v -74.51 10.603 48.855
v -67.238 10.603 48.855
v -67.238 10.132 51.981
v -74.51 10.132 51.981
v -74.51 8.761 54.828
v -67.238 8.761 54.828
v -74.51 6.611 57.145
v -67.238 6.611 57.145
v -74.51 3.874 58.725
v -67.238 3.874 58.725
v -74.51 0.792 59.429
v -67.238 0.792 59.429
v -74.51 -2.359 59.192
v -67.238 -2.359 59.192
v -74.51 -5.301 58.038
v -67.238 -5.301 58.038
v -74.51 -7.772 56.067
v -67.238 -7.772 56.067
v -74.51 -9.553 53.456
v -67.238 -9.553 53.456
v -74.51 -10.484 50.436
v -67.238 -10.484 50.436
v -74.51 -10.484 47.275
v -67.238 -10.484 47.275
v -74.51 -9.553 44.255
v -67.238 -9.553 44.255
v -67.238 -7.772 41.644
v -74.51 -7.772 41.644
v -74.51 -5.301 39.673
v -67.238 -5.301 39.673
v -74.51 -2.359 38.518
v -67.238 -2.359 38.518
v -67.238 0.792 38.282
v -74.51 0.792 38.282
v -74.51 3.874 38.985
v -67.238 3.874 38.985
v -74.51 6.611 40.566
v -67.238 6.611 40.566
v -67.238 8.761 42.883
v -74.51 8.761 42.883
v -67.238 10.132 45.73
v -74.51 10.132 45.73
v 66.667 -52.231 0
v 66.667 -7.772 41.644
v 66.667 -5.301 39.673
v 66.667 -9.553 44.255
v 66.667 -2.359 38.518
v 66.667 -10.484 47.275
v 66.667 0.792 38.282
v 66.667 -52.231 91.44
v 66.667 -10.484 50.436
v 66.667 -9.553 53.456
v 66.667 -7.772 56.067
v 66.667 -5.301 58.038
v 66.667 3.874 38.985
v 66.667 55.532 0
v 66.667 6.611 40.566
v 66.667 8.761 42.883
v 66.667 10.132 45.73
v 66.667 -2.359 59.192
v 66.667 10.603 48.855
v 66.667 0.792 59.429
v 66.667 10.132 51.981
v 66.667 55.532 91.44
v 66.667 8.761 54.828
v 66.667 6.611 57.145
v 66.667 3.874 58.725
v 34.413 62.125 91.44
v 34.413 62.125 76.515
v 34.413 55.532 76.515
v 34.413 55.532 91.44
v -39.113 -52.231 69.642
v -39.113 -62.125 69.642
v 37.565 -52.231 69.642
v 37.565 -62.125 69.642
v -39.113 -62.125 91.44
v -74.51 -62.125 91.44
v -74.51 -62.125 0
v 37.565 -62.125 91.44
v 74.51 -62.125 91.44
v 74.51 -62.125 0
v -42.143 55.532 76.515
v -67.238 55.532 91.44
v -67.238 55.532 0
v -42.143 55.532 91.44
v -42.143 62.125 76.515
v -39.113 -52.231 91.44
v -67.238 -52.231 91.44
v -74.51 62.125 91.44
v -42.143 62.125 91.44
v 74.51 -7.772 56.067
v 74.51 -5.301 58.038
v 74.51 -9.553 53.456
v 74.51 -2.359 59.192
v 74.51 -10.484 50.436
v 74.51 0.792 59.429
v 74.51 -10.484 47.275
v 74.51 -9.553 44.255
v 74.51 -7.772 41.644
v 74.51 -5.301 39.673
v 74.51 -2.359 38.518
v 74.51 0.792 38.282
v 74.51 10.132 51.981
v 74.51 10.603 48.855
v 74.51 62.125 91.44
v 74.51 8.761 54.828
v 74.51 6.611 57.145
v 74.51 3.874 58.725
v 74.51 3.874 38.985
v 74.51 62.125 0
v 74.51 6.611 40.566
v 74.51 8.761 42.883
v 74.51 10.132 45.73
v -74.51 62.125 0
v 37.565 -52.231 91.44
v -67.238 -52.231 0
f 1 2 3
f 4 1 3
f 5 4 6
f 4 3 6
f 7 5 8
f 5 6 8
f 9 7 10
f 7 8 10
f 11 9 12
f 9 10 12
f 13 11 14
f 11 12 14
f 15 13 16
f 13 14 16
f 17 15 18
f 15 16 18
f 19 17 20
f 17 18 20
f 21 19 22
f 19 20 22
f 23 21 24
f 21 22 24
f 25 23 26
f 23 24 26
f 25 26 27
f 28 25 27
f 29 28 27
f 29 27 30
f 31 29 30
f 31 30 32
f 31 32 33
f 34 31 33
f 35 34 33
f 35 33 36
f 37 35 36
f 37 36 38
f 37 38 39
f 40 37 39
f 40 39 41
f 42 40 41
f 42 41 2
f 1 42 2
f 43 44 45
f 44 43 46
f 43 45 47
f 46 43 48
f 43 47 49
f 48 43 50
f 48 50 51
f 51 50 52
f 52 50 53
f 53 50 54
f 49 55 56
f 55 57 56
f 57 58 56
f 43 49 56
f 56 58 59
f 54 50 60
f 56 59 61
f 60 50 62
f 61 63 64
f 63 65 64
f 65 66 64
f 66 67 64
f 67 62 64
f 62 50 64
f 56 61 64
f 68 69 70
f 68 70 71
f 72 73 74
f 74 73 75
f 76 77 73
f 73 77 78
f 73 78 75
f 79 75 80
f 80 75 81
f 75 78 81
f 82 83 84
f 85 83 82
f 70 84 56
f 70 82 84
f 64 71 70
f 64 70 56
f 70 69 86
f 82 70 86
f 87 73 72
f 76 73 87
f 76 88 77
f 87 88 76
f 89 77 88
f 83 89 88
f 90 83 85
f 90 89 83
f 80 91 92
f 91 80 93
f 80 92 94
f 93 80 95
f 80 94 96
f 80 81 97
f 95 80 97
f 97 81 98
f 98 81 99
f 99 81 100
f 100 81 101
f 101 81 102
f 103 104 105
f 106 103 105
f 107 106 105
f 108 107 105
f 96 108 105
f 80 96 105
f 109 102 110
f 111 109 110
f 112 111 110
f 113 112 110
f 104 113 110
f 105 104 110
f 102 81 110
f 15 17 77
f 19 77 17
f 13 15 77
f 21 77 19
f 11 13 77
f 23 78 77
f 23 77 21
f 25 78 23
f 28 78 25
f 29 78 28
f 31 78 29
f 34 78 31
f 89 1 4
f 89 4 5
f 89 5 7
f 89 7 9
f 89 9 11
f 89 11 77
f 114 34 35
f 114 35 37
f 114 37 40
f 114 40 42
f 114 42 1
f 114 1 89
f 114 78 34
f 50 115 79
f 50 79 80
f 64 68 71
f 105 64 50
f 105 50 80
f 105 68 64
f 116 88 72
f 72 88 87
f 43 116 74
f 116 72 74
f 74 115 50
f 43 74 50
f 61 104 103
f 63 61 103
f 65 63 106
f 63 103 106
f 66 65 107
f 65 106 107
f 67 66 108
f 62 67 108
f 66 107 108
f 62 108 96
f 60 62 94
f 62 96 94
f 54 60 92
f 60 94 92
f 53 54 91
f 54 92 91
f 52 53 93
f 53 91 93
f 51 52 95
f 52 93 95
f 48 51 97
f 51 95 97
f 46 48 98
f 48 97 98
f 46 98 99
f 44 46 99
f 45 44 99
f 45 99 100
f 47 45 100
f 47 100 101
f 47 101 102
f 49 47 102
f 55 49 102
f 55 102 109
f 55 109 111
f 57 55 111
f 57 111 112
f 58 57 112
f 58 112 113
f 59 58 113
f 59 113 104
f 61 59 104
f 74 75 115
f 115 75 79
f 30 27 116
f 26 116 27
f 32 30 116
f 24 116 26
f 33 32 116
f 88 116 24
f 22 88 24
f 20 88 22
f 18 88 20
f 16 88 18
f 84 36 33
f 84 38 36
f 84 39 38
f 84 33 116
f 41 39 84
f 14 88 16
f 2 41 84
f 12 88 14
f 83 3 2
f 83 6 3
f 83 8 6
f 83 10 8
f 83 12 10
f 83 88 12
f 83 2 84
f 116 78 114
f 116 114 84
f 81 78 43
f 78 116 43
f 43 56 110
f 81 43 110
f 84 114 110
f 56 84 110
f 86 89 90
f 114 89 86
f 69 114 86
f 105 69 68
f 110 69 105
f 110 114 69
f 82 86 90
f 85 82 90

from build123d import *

# Parameters (mm, degrees)
F0_W     = 149.0205824375
F0_H     = 124.2497935891
F1_DEPTH = 91.44
F2_W     = 133.9053437114
F2_H     = 107.7639774892
F3_DEPTH = 91.441
F4_W     = 76.6777545214
F4_H     = 21.7983949804
F5_DEPTH = 25.4
F6_W     = 76.5557736158
F6_H     = 14.9245489264
F7_DEPTH = 25.4
F8_R     = 10.6028855258
F9_DEPTH = 149.0215824375


with BuildPart() as f1:
    # F0 (on Top) → F1 (new body)
    with BuildSketch(Plane.XY):
        Rectangle(F0_W, F0_H)
    extrude(amount=F1_DEPTH)

    # F2 (on face) → F3 (cut, through all)
    with BuildSketch(Plane.XY.offset(91.44)):
        with Locations((-0.2857260406, 1.6505084932)):
            Rectangle(F2_W, F2_H)
    extrude(amount=-F3_DEPTH, mode=Mode.SUBTRACT)

    # F4 (on face) → F5 (cut)
    with BuildSketch(Plane.XZ.offset(62.1248967946)):
        with Locations((-0.7736906409, 80.5408025098)):
            Rectangle(F4_W, F4_H)
    extrude(amount=-F5_DEPTH, mode=Mode.SUBTRACT)

    # F6 (on face) → F7 (cut)
    with BuildSketch(Plane(origin=(0, 62.1248967946, 0), x_dir=(-1, 0, 0), z_dir=(0, 1, 0))):
        with Locations((3.8653835654, 83.9777255368)):
            Rectangle(F6_W, F6_H)
    extrude(amount=-F7_DEPTH, mode=Mode.SUBTRACT)

    # F8 (on face) → F9 (cut, through all)
    with BuildSketch(Plane.YZ.offset(74.5102912188)):
        with Locations((0, 48.8554276526)):
            Circle(F8_R)
    extrude(amount=-F9_DEPTH, mode=Mode.SUBTRACT)


solid = f1.part
